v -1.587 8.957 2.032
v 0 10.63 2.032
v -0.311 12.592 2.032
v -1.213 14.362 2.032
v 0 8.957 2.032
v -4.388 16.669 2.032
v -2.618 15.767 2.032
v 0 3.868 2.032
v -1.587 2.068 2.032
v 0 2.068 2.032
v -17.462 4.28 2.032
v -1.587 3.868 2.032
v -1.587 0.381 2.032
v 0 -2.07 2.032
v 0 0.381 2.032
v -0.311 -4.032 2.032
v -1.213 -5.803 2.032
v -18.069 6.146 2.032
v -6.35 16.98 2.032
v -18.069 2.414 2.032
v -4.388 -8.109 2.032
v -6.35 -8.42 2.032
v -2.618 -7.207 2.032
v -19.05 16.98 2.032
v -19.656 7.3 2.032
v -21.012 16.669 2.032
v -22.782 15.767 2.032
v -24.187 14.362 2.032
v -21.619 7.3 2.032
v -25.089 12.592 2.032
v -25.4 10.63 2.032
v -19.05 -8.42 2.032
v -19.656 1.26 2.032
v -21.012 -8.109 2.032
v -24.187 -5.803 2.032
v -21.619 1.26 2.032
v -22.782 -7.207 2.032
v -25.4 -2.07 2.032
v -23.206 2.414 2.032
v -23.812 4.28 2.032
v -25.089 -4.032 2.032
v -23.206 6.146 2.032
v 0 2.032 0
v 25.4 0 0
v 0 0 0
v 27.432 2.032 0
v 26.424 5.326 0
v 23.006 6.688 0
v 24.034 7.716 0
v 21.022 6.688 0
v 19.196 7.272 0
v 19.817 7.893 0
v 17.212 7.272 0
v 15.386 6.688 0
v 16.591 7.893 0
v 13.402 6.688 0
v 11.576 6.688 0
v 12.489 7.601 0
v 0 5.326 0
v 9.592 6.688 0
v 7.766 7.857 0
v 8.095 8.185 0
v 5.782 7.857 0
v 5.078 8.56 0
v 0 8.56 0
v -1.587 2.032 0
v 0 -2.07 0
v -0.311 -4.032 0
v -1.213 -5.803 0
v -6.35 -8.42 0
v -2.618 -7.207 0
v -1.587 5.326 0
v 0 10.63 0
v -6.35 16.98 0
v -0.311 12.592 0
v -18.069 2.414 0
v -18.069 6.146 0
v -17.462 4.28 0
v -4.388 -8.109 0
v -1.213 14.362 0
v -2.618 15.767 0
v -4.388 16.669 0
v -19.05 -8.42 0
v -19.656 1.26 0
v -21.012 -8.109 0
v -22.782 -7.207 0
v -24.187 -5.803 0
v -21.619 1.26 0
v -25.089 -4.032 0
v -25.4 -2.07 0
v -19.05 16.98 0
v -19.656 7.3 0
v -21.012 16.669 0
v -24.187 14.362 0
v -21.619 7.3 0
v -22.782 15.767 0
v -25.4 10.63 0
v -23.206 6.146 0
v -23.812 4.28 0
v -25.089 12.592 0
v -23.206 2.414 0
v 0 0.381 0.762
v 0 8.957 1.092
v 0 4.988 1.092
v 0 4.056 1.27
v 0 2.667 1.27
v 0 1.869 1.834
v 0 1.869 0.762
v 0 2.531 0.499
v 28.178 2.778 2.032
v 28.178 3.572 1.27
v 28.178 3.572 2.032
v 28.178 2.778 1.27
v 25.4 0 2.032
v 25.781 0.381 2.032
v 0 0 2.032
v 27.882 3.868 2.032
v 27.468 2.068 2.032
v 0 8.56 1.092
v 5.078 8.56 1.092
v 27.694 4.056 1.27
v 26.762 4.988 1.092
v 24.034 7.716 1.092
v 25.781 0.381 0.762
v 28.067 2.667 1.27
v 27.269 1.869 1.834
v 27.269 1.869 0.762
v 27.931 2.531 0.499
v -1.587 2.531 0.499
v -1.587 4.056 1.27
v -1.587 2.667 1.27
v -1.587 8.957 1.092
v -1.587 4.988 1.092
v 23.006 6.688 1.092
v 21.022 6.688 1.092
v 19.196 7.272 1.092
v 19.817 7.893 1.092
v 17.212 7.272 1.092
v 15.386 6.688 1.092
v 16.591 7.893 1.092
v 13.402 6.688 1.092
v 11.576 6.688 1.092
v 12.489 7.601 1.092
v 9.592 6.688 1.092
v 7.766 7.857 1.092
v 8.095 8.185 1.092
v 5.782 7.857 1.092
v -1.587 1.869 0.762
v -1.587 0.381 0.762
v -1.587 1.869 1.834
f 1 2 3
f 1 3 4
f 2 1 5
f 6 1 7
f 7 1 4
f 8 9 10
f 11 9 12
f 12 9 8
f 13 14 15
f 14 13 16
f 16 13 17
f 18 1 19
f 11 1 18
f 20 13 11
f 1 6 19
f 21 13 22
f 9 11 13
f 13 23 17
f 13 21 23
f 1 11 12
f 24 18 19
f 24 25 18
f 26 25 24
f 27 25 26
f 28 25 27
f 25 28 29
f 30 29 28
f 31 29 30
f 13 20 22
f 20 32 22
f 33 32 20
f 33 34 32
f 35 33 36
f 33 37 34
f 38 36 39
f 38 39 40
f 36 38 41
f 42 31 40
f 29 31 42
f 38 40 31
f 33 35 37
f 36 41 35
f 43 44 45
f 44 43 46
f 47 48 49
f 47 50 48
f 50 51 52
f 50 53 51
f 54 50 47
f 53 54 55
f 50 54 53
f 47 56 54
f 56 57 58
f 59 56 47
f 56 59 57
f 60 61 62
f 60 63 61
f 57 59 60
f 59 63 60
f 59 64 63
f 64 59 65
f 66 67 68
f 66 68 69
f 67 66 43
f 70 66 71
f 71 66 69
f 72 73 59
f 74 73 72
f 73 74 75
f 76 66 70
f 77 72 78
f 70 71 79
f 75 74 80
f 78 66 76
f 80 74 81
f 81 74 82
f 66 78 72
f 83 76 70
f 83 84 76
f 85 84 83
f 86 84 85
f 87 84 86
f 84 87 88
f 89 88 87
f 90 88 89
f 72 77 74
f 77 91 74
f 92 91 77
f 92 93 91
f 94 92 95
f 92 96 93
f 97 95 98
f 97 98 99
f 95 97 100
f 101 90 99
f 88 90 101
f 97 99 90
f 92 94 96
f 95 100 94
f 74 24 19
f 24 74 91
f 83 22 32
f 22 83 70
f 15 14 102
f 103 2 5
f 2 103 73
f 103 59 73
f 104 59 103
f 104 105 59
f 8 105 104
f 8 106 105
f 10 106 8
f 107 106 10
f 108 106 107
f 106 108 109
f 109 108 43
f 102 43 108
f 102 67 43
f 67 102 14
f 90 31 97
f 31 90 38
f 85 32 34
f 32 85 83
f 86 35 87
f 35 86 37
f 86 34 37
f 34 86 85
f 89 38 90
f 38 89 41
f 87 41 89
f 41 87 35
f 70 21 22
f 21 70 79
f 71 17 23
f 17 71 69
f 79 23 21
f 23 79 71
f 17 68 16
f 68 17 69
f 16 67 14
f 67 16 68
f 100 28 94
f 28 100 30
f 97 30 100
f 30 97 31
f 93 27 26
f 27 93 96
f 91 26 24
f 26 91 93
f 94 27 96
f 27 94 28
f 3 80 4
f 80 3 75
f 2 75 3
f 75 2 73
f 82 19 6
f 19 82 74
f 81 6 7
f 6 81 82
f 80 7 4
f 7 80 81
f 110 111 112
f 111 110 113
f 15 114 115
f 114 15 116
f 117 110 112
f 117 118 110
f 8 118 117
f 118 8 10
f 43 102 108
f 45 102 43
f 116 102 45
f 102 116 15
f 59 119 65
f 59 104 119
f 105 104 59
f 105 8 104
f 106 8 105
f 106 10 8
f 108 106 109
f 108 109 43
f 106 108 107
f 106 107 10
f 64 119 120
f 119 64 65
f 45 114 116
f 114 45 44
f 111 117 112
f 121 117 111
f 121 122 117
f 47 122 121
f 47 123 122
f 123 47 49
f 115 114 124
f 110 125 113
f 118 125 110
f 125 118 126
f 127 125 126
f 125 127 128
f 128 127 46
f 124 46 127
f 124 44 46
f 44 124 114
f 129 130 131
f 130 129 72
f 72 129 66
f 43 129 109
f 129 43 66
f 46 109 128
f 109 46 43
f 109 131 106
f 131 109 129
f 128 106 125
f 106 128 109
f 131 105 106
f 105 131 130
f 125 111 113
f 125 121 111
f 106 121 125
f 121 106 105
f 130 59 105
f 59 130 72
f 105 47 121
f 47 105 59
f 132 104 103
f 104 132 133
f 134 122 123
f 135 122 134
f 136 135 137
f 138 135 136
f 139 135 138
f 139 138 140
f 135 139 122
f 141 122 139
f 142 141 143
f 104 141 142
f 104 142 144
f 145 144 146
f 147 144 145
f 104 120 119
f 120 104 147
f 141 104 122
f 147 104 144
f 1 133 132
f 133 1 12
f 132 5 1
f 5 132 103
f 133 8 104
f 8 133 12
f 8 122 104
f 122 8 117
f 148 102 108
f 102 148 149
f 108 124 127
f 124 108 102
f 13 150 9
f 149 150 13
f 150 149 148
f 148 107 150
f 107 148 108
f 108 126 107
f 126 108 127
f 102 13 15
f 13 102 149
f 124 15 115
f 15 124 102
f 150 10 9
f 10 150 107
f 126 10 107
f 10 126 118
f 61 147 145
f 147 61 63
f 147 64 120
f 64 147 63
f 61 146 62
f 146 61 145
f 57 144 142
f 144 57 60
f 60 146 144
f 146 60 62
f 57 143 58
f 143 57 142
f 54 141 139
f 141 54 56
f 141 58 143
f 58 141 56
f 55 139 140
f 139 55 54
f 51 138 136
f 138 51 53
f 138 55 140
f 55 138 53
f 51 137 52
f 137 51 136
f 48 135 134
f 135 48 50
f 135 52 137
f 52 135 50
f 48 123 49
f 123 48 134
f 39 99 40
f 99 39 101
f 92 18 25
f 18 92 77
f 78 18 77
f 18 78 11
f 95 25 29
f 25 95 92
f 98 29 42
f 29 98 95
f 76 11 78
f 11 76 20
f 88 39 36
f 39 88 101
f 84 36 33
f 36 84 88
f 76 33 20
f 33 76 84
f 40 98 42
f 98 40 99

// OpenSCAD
function mm(i) = i*25.4;

module rounded(size, r) {
    union() {
        translate([r, 0, 0]) cube([size[0]-2*r, size[1], size[2]]);
        translate([0, r, 0]) cube([size[0], size[1]-2*r, size[2]]);
        translate([r, r, 0]) cylinder(h=size[2], r=r);
        translate([size[0]-r, r, 0]) cylinder(h=size[2], r=r);
        translate([r, size[1]-r, 0]) cylinder(h=size[2], r=r);
        translate([size[0]-r, size[1]-r, 0]) cylinder(h=size[2], r=r);
    }
}

module bit() {
    w = mm(1/4);
    difference() {
        translate([-w/2, 0, 0]) cube([w, mm(1), w]);
        translate([-mm(5/128), 0, 0]) rotate([0, 0, 135]) cube([w, w, w]);
        translate([mm(5/128), 0, 0]) rotate([0, 0, -45]) cube([w, w, w]);
    }
}

module kw1(bits) {
    thickness = mm(0.080);
    length = mm(9/8);
    width = mm(.337);
    
    shoulder = mm(.247);
    pin_spacing = mm(.15);
    depth_inc = mm(.023);

    fudge = 0.5;
    
    h_l = mm(1);
    h_w = mm(1);
    h_d = mm(1/16);
    difference() {
        union() {
            translate([-h_l, -h_w/2 + width/2, 0]) rounded([h_l, h_w, thickness], mm(1/4));
            // cut a little off the tip to avoid going too long
            cube([length - mm(1/64), width, thickness]);
        }

        translate([length, mm(1/8), 0]) {
            rotate([0, 0, 45]) cube([10, 10, thickness]);
            rotate([0, 0, 225]) cube([10, 10, thickness]);
        }
        

        translate([-h_l + mm(3/16), width/2, 0]) cylinder(h=thickness, r=mm(1/8));
        union() {
            translate([-h_d, mm(.105), mm(.025)]) rotate([225, 0, 0]) cube([length + h_d, width, width]);
            translate([-h_d, mm(.105), mm(.05)]) rotate([260, 0, 0]) cube([length + h_d, thickness/2, mm(1/32)]);
            translate([-h_d, mm(.105), 0]) cube([length + h_d, mm(7/128), mm(.05)]);
            translate([-h_d, mm(.105) + mm(7/128), mm(.05)]) rotate([225, 0, 0]) cube([length + h_d, mm(3/64), thickness]);
        }
        
        translate([-h_d, width - mm(9/64), mm(.043)]) {
            cube([length + h_d, width - (width - mm(10/64)), thickness]);
            rotate([50, 0, 0]) cube([length + h_d, width, thickness]);
        }
        
        union() {
            translate([-h_d, mm(0.015), mm(.03)]) cube([length + h_d, mm(15/256), thickness]);
            translate([-h_d, mm(0.015) + mm(13/256), thickness - mm(1/64)]) rotate([45, 0, 0]) cube([length + h_d, mm(1/16), mm(1/16)]);
        }

        for (b = [0:4]) {
            translate([shoulder + fudge + b*pin_spacing, width - mm(.008) - (bits[b] - 1)*depth_inc - fudge, 0]) bit();
        }
    }
}

kw1([1,3,3,2,3]);
